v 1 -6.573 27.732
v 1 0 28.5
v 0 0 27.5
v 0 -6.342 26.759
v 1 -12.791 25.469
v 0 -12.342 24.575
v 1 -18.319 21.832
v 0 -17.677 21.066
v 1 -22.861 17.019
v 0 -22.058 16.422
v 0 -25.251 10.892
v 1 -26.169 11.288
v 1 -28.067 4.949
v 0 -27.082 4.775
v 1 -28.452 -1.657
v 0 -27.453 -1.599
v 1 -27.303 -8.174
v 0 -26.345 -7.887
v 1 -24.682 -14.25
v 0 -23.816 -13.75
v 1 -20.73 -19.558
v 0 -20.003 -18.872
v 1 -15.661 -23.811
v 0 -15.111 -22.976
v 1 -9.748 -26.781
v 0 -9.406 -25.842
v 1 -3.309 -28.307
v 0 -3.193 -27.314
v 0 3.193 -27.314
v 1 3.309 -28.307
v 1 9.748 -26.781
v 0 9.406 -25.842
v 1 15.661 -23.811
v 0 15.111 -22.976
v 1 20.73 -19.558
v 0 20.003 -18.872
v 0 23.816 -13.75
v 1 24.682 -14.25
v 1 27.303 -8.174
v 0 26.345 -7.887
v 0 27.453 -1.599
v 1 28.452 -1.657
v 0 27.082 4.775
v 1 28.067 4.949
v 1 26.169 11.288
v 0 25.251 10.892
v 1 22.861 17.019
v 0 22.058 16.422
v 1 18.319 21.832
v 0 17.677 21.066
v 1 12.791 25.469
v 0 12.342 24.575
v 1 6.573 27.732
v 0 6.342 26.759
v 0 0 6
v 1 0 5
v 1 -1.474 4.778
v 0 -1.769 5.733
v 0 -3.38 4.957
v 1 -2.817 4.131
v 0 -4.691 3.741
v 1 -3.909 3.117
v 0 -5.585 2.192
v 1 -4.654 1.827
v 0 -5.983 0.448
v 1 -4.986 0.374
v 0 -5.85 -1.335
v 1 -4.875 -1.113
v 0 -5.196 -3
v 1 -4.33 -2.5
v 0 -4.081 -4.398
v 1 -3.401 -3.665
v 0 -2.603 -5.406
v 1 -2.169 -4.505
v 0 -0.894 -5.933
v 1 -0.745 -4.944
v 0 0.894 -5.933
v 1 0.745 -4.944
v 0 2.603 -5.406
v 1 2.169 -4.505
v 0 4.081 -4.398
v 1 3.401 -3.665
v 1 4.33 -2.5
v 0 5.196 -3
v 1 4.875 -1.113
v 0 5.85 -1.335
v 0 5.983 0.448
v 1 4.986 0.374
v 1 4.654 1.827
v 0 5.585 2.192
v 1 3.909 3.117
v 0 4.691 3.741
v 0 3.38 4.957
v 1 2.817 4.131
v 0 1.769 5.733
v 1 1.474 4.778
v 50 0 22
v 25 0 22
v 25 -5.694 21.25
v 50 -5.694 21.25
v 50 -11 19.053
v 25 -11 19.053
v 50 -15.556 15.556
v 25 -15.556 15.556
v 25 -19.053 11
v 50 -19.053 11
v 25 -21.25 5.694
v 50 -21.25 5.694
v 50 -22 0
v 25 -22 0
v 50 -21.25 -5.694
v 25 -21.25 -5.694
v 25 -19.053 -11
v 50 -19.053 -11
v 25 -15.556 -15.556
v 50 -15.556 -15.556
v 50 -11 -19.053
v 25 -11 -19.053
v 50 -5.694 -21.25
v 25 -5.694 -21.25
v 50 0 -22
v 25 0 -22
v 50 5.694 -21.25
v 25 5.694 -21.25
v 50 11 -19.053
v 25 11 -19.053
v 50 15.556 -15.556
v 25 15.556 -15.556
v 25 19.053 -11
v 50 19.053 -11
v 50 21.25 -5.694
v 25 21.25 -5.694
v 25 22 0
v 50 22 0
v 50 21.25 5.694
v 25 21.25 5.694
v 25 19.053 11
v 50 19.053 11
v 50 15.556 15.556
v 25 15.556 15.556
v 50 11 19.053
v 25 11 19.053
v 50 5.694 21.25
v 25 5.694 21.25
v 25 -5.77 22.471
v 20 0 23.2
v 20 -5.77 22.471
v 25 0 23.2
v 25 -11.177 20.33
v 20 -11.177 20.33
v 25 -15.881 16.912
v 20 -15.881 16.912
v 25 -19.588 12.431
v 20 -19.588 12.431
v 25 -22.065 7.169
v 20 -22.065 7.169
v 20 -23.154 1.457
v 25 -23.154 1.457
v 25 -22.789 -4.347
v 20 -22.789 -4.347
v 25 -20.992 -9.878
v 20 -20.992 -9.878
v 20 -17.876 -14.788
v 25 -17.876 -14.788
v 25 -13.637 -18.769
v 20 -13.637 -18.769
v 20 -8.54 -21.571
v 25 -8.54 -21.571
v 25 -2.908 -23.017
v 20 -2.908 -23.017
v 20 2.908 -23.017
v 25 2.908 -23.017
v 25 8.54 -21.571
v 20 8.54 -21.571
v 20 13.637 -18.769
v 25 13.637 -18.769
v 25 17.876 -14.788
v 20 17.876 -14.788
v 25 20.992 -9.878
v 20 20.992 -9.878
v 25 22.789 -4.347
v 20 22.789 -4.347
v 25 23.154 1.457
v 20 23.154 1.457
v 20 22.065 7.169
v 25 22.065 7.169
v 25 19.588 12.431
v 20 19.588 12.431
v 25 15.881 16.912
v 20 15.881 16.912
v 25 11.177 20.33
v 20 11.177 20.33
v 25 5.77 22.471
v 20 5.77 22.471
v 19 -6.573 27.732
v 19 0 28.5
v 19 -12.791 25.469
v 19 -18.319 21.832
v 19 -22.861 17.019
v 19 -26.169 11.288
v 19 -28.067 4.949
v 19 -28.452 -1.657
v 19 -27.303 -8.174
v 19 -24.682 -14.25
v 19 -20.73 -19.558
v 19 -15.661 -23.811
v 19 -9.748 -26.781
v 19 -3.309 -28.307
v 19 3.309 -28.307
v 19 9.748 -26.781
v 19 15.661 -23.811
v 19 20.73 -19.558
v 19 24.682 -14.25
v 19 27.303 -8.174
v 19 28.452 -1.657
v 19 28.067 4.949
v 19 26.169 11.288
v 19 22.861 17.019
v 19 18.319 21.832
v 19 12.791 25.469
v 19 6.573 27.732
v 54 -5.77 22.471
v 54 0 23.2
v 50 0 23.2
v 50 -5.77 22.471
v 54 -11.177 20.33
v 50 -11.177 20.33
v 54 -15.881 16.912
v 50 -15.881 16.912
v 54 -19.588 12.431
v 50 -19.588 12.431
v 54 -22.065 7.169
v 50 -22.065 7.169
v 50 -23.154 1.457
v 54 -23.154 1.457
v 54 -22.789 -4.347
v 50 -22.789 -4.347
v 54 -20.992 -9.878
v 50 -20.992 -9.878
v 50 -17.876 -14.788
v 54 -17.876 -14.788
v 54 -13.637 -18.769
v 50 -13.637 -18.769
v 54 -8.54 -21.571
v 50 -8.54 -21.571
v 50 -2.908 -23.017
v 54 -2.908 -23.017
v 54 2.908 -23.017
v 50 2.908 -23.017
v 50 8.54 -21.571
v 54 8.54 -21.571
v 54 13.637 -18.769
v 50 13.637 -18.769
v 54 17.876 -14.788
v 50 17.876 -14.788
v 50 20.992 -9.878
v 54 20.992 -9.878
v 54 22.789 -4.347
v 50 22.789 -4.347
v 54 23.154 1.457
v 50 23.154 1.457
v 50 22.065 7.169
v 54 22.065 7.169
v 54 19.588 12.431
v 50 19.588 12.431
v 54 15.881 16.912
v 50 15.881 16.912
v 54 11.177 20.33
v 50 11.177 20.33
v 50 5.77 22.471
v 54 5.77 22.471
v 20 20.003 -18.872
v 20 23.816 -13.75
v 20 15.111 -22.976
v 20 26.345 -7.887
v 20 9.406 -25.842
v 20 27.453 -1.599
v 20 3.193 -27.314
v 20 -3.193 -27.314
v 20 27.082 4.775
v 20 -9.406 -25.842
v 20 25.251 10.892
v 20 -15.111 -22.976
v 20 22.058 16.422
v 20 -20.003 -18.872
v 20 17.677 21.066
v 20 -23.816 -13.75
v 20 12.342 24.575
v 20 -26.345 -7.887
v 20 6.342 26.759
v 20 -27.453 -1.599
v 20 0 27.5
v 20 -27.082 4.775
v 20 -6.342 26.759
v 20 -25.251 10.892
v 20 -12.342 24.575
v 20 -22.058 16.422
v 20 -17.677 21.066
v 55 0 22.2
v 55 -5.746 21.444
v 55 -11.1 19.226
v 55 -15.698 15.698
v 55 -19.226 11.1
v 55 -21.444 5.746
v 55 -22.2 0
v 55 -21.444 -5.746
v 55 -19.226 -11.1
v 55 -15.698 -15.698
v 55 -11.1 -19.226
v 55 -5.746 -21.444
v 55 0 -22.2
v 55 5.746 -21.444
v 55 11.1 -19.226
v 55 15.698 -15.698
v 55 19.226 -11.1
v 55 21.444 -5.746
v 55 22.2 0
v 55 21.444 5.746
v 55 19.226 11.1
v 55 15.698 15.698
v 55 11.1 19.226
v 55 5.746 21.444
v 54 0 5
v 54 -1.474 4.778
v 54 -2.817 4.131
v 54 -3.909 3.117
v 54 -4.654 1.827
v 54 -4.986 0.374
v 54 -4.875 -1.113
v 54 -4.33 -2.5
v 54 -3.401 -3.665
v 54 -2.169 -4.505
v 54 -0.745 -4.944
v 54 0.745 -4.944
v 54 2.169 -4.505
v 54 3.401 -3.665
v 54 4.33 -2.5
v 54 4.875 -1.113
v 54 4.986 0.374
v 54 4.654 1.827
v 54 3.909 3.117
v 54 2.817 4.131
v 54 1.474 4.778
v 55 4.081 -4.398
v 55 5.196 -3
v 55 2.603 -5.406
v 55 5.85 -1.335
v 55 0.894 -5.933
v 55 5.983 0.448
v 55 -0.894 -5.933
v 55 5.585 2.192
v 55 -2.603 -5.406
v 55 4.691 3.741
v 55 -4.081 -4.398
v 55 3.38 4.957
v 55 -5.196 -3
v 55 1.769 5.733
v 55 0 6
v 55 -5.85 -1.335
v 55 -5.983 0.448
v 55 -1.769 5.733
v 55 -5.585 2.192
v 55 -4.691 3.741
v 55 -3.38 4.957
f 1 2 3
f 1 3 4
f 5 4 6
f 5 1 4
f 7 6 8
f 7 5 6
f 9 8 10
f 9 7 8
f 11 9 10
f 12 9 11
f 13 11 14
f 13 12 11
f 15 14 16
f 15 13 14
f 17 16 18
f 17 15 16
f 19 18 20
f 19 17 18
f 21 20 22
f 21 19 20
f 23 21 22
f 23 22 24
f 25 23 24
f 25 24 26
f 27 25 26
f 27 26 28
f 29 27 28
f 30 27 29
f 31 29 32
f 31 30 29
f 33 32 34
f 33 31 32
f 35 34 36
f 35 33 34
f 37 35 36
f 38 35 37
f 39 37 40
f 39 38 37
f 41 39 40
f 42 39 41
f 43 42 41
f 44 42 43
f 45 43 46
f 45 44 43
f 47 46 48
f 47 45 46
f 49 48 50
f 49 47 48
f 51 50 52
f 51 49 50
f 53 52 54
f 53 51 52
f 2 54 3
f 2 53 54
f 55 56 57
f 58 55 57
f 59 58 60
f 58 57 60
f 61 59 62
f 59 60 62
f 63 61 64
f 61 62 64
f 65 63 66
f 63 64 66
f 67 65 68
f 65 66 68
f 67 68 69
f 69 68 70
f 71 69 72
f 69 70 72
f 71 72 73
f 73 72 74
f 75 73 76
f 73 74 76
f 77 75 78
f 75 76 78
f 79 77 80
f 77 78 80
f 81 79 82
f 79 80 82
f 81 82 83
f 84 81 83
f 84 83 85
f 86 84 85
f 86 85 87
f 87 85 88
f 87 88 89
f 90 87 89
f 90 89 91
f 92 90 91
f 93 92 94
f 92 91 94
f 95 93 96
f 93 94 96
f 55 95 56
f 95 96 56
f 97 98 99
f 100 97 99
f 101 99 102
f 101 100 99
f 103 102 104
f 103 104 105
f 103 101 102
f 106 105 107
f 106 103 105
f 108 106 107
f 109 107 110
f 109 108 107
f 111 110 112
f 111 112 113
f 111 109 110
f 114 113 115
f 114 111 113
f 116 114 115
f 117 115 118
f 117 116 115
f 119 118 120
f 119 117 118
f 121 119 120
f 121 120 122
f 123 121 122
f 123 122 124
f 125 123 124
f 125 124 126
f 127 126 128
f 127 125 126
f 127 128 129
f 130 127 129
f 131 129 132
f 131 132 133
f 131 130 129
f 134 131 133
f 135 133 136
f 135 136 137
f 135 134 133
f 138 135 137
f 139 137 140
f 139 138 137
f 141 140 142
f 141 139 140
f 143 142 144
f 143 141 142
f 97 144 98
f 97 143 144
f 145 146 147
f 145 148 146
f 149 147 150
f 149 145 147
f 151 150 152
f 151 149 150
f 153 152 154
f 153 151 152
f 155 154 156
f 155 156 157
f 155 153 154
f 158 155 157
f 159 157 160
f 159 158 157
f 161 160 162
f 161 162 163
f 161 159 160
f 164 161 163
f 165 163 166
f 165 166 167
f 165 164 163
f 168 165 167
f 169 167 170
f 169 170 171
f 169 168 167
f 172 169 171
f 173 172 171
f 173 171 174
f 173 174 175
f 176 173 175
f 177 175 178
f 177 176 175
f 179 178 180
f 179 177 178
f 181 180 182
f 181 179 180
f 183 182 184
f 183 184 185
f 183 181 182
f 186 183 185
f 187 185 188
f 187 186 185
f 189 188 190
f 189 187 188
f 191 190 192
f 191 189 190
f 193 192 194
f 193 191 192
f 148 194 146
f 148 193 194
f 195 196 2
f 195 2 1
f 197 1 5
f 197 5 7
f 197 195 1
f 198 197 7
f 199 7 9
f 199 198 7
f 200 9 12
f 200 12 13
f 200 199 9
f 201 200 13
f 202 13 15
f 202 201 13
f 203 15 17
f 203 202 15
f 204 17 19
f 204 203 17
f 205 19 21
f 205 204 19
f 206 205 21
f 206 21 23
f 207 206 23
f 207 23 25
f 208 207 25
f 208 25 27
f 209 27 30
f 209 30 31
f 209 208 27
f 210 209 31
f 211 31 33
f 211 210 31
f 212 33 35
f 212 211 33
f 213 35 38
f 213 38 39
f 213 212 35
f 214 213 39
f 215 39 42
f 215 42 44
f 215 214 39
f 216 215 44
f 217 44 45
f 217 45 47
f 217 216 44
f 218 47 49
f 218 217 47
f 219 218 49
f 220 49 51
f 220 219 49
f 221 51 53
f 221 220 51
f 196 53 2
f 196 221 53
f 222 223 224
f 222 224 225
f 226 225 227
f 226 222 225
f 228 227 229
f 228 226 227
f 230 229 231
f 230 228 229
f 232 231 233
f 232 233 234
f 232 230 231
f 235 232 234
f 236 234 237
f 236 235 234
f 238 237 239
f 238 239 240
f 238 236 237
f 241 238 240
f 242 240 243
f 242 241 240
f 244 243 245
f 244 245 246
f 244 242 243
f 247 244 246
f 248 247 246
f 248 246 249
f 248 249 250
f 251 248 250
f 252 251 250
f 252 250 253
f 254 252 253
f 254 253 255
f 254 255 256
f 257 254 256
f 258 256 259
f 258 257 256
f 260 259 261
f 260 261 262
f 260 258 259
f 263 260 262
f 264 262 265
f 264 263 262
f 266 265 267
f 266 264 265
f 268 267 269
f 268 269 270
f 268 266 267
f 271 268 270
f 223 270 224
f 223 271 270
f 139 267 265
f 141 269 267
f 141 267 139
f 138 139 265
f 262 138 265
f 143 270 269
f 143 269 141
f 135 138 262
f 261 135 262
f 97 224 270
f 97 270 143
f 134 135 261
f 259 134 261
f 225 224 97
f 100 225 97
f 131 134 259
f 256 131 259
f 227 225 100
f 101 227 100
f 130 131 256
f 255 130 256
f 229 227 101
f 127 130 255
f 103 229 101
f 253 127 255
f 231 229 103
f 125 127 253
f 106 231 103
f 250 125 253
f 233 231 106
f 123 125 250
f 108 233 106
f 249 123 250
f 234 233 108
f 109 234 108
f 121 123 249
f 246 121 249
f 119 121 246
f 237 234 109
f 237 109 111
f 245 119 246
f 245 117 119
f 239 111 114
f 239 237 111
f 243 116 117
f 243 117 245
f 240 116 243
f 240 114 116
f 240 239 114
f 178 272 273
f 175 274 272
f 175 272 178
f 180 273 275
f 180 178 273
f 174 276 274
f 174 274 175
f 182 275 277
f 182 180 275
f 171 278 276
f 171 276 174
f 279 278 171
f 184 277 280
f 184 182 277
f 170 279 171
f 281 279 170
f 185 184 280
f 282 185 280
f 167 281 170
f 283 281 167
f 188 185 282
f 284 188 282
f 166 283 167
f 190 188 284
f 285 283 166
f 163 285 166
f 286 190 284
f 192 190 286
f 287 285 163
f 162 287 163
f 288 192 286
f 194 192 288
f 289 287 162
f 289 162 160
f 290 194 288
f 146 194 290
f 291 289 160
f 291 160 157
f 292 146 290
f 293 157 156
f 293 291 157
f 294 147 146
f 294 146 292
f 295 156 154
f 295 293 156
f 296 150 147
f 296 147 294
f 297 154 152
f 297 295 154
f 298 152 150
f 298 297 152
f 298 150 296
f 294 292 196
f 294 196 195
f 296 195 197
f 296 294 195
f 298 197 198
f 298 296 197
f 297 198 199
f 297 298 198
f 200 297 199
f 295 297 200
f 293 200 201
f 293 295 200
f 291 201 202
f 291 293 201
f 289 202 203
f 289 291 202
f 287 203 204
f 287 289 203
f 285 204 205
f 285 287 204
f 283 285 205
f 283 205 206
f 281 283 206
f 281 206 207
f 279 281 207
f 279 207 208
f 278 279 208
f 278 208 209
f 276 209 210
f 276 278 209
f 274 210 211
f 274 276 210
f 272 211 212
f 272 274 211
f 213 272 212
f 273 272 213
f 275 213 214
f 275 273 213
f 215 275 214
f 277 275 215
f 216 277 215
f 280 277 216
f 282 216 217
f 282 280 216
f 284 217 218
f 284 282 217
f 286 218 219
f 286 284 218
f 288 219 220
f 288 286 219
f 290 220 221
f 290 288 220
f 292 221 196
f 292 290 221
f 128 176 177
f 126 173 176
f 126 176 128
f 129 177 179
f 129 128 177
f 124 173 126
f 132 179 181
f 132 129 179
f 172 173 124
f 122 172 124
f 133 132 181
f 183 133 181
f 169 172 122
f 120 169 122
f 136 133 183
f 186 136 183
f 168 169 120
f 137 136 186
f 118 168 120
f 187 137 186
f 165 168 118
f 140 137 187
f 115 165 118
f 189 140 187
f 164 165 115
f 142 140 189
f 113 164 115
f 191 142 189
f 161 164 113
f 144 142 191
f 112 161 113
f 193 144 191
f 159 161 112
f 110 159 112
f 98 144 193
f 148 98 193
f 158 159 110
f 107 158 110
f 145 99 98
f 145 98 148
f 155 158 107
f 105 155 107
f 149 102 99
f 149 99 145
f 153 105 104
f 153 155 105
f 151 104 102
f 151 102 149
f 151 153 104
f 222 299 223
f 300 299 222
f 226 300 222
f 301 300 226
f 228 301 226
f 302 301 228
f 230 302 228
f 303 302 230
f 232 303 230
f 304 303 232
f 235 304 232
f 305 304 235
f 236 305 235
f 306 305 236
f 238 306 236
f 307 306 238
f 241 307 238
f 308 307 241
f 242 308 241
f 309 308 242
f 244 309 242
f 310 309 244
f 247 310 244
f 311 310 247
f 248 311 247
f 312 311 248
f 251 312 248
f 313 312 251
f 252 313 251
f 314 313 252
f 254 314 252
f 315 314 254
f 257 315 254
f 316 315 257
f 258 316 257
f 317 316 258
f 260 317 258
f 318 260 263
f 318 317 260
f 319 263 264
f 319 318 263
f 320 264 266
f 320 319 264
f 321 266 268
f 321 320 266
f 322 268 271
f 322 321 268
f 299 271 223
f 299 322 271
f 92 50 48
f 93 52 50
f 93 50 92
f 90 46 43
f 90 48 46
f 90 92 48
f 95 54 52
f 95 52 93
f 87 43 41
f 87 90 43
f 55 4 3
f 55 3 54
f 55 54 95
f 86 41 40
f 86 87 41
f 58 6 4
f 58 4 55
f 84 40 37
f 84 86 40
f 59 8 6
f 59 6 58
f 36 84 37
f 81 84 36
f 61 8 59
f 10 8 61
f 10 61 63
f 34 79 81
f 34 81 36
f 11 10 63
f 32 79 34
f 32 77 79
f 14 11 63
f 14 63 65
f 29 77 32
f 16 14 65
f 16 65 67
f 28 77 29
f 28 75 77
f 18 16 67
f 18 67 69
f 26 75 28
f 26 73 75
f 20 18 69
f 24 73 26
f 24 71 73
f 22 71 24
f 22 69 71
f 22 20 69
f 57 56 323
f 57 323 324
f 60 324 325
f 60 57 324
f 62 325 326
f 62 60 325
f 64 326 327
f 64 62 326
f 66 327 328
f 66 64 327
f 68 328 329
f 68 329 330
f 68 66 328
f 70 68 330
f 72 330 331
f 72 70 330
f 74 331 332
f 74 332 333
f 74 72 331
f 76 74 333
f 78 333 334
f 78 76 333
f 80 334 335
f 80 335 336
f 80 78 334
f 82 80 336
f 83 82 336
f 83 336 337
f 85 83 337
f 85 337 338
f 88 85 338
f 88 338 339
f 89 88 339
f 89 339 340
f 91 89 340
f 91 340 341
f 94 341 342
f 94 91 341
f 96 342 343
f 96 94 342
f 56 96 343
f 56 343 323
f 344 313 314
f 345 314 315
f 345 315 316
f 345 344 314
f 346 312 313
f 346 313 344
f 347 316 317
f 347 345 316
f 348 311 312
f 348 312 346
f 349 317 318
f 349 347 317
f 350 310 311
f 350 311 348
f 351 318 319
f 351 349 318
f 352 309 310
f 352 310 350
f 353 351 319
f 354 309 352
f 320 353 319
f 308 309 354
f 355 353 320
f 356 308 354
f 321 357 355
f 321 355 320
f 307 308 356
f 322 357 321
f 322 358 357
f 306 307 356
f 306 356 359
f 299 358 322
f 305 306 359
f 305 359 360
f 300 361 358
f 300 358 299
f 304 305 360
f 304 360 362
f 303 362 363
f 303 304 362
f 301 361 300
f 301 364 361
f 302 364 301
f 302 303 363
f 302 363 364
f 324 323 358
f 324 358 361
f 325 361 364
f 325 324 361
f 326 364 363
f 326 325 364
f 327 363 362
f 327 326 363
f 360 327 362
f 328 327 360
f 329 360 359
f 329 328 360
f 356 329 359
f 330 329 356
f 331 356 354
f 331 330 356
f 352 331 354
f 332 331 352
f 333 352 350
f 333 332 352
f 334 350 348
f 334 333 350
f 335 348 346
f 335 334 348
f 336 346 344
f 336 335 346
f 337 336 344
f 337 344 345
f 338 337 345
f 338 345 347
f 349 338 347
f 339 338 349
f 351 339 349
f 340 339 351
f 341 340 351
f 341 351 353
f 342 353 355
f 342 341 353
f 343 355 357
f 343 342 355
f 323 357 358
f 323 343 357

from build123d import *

# Parameters (mm, degrees)
CHAMFER_4_SIZE = 1


with BuildPart() as part:
    # Эскиз1 → Повернуть1 (revolve)
    with BuildSketch(Plane.XY, mode=Mode.PRIVATE) as revolve_1_sk:
        Polygon((0, 5), (0, 28.5), (20, 28.5), (20, 23.2), (25, 23.2), (25, 22), (50, 22), (50, 23.2), (55, 23.2), (55, 5), align=None)
    revolve(revolve_1_sk.sketch.rotate(Axis((0, 0, 0), (1, 0, 0)), 90), axis=Axis((0, 0, 0), (1, 0, 0)))

    # Фаска4
    chamfer_4_edges = [part.edges().sort_by_distance(p)[0] for p in [
        (55, 0, -23.2),
        (55, 0, -5),
        (0, 0, -5),
        (0, 0, -28.5),
        (20, 0, -28.5),
    ]]
    chamfer(chamfer_4_edges, length=CHAMFER_4_SIZE)


solid = part.part
